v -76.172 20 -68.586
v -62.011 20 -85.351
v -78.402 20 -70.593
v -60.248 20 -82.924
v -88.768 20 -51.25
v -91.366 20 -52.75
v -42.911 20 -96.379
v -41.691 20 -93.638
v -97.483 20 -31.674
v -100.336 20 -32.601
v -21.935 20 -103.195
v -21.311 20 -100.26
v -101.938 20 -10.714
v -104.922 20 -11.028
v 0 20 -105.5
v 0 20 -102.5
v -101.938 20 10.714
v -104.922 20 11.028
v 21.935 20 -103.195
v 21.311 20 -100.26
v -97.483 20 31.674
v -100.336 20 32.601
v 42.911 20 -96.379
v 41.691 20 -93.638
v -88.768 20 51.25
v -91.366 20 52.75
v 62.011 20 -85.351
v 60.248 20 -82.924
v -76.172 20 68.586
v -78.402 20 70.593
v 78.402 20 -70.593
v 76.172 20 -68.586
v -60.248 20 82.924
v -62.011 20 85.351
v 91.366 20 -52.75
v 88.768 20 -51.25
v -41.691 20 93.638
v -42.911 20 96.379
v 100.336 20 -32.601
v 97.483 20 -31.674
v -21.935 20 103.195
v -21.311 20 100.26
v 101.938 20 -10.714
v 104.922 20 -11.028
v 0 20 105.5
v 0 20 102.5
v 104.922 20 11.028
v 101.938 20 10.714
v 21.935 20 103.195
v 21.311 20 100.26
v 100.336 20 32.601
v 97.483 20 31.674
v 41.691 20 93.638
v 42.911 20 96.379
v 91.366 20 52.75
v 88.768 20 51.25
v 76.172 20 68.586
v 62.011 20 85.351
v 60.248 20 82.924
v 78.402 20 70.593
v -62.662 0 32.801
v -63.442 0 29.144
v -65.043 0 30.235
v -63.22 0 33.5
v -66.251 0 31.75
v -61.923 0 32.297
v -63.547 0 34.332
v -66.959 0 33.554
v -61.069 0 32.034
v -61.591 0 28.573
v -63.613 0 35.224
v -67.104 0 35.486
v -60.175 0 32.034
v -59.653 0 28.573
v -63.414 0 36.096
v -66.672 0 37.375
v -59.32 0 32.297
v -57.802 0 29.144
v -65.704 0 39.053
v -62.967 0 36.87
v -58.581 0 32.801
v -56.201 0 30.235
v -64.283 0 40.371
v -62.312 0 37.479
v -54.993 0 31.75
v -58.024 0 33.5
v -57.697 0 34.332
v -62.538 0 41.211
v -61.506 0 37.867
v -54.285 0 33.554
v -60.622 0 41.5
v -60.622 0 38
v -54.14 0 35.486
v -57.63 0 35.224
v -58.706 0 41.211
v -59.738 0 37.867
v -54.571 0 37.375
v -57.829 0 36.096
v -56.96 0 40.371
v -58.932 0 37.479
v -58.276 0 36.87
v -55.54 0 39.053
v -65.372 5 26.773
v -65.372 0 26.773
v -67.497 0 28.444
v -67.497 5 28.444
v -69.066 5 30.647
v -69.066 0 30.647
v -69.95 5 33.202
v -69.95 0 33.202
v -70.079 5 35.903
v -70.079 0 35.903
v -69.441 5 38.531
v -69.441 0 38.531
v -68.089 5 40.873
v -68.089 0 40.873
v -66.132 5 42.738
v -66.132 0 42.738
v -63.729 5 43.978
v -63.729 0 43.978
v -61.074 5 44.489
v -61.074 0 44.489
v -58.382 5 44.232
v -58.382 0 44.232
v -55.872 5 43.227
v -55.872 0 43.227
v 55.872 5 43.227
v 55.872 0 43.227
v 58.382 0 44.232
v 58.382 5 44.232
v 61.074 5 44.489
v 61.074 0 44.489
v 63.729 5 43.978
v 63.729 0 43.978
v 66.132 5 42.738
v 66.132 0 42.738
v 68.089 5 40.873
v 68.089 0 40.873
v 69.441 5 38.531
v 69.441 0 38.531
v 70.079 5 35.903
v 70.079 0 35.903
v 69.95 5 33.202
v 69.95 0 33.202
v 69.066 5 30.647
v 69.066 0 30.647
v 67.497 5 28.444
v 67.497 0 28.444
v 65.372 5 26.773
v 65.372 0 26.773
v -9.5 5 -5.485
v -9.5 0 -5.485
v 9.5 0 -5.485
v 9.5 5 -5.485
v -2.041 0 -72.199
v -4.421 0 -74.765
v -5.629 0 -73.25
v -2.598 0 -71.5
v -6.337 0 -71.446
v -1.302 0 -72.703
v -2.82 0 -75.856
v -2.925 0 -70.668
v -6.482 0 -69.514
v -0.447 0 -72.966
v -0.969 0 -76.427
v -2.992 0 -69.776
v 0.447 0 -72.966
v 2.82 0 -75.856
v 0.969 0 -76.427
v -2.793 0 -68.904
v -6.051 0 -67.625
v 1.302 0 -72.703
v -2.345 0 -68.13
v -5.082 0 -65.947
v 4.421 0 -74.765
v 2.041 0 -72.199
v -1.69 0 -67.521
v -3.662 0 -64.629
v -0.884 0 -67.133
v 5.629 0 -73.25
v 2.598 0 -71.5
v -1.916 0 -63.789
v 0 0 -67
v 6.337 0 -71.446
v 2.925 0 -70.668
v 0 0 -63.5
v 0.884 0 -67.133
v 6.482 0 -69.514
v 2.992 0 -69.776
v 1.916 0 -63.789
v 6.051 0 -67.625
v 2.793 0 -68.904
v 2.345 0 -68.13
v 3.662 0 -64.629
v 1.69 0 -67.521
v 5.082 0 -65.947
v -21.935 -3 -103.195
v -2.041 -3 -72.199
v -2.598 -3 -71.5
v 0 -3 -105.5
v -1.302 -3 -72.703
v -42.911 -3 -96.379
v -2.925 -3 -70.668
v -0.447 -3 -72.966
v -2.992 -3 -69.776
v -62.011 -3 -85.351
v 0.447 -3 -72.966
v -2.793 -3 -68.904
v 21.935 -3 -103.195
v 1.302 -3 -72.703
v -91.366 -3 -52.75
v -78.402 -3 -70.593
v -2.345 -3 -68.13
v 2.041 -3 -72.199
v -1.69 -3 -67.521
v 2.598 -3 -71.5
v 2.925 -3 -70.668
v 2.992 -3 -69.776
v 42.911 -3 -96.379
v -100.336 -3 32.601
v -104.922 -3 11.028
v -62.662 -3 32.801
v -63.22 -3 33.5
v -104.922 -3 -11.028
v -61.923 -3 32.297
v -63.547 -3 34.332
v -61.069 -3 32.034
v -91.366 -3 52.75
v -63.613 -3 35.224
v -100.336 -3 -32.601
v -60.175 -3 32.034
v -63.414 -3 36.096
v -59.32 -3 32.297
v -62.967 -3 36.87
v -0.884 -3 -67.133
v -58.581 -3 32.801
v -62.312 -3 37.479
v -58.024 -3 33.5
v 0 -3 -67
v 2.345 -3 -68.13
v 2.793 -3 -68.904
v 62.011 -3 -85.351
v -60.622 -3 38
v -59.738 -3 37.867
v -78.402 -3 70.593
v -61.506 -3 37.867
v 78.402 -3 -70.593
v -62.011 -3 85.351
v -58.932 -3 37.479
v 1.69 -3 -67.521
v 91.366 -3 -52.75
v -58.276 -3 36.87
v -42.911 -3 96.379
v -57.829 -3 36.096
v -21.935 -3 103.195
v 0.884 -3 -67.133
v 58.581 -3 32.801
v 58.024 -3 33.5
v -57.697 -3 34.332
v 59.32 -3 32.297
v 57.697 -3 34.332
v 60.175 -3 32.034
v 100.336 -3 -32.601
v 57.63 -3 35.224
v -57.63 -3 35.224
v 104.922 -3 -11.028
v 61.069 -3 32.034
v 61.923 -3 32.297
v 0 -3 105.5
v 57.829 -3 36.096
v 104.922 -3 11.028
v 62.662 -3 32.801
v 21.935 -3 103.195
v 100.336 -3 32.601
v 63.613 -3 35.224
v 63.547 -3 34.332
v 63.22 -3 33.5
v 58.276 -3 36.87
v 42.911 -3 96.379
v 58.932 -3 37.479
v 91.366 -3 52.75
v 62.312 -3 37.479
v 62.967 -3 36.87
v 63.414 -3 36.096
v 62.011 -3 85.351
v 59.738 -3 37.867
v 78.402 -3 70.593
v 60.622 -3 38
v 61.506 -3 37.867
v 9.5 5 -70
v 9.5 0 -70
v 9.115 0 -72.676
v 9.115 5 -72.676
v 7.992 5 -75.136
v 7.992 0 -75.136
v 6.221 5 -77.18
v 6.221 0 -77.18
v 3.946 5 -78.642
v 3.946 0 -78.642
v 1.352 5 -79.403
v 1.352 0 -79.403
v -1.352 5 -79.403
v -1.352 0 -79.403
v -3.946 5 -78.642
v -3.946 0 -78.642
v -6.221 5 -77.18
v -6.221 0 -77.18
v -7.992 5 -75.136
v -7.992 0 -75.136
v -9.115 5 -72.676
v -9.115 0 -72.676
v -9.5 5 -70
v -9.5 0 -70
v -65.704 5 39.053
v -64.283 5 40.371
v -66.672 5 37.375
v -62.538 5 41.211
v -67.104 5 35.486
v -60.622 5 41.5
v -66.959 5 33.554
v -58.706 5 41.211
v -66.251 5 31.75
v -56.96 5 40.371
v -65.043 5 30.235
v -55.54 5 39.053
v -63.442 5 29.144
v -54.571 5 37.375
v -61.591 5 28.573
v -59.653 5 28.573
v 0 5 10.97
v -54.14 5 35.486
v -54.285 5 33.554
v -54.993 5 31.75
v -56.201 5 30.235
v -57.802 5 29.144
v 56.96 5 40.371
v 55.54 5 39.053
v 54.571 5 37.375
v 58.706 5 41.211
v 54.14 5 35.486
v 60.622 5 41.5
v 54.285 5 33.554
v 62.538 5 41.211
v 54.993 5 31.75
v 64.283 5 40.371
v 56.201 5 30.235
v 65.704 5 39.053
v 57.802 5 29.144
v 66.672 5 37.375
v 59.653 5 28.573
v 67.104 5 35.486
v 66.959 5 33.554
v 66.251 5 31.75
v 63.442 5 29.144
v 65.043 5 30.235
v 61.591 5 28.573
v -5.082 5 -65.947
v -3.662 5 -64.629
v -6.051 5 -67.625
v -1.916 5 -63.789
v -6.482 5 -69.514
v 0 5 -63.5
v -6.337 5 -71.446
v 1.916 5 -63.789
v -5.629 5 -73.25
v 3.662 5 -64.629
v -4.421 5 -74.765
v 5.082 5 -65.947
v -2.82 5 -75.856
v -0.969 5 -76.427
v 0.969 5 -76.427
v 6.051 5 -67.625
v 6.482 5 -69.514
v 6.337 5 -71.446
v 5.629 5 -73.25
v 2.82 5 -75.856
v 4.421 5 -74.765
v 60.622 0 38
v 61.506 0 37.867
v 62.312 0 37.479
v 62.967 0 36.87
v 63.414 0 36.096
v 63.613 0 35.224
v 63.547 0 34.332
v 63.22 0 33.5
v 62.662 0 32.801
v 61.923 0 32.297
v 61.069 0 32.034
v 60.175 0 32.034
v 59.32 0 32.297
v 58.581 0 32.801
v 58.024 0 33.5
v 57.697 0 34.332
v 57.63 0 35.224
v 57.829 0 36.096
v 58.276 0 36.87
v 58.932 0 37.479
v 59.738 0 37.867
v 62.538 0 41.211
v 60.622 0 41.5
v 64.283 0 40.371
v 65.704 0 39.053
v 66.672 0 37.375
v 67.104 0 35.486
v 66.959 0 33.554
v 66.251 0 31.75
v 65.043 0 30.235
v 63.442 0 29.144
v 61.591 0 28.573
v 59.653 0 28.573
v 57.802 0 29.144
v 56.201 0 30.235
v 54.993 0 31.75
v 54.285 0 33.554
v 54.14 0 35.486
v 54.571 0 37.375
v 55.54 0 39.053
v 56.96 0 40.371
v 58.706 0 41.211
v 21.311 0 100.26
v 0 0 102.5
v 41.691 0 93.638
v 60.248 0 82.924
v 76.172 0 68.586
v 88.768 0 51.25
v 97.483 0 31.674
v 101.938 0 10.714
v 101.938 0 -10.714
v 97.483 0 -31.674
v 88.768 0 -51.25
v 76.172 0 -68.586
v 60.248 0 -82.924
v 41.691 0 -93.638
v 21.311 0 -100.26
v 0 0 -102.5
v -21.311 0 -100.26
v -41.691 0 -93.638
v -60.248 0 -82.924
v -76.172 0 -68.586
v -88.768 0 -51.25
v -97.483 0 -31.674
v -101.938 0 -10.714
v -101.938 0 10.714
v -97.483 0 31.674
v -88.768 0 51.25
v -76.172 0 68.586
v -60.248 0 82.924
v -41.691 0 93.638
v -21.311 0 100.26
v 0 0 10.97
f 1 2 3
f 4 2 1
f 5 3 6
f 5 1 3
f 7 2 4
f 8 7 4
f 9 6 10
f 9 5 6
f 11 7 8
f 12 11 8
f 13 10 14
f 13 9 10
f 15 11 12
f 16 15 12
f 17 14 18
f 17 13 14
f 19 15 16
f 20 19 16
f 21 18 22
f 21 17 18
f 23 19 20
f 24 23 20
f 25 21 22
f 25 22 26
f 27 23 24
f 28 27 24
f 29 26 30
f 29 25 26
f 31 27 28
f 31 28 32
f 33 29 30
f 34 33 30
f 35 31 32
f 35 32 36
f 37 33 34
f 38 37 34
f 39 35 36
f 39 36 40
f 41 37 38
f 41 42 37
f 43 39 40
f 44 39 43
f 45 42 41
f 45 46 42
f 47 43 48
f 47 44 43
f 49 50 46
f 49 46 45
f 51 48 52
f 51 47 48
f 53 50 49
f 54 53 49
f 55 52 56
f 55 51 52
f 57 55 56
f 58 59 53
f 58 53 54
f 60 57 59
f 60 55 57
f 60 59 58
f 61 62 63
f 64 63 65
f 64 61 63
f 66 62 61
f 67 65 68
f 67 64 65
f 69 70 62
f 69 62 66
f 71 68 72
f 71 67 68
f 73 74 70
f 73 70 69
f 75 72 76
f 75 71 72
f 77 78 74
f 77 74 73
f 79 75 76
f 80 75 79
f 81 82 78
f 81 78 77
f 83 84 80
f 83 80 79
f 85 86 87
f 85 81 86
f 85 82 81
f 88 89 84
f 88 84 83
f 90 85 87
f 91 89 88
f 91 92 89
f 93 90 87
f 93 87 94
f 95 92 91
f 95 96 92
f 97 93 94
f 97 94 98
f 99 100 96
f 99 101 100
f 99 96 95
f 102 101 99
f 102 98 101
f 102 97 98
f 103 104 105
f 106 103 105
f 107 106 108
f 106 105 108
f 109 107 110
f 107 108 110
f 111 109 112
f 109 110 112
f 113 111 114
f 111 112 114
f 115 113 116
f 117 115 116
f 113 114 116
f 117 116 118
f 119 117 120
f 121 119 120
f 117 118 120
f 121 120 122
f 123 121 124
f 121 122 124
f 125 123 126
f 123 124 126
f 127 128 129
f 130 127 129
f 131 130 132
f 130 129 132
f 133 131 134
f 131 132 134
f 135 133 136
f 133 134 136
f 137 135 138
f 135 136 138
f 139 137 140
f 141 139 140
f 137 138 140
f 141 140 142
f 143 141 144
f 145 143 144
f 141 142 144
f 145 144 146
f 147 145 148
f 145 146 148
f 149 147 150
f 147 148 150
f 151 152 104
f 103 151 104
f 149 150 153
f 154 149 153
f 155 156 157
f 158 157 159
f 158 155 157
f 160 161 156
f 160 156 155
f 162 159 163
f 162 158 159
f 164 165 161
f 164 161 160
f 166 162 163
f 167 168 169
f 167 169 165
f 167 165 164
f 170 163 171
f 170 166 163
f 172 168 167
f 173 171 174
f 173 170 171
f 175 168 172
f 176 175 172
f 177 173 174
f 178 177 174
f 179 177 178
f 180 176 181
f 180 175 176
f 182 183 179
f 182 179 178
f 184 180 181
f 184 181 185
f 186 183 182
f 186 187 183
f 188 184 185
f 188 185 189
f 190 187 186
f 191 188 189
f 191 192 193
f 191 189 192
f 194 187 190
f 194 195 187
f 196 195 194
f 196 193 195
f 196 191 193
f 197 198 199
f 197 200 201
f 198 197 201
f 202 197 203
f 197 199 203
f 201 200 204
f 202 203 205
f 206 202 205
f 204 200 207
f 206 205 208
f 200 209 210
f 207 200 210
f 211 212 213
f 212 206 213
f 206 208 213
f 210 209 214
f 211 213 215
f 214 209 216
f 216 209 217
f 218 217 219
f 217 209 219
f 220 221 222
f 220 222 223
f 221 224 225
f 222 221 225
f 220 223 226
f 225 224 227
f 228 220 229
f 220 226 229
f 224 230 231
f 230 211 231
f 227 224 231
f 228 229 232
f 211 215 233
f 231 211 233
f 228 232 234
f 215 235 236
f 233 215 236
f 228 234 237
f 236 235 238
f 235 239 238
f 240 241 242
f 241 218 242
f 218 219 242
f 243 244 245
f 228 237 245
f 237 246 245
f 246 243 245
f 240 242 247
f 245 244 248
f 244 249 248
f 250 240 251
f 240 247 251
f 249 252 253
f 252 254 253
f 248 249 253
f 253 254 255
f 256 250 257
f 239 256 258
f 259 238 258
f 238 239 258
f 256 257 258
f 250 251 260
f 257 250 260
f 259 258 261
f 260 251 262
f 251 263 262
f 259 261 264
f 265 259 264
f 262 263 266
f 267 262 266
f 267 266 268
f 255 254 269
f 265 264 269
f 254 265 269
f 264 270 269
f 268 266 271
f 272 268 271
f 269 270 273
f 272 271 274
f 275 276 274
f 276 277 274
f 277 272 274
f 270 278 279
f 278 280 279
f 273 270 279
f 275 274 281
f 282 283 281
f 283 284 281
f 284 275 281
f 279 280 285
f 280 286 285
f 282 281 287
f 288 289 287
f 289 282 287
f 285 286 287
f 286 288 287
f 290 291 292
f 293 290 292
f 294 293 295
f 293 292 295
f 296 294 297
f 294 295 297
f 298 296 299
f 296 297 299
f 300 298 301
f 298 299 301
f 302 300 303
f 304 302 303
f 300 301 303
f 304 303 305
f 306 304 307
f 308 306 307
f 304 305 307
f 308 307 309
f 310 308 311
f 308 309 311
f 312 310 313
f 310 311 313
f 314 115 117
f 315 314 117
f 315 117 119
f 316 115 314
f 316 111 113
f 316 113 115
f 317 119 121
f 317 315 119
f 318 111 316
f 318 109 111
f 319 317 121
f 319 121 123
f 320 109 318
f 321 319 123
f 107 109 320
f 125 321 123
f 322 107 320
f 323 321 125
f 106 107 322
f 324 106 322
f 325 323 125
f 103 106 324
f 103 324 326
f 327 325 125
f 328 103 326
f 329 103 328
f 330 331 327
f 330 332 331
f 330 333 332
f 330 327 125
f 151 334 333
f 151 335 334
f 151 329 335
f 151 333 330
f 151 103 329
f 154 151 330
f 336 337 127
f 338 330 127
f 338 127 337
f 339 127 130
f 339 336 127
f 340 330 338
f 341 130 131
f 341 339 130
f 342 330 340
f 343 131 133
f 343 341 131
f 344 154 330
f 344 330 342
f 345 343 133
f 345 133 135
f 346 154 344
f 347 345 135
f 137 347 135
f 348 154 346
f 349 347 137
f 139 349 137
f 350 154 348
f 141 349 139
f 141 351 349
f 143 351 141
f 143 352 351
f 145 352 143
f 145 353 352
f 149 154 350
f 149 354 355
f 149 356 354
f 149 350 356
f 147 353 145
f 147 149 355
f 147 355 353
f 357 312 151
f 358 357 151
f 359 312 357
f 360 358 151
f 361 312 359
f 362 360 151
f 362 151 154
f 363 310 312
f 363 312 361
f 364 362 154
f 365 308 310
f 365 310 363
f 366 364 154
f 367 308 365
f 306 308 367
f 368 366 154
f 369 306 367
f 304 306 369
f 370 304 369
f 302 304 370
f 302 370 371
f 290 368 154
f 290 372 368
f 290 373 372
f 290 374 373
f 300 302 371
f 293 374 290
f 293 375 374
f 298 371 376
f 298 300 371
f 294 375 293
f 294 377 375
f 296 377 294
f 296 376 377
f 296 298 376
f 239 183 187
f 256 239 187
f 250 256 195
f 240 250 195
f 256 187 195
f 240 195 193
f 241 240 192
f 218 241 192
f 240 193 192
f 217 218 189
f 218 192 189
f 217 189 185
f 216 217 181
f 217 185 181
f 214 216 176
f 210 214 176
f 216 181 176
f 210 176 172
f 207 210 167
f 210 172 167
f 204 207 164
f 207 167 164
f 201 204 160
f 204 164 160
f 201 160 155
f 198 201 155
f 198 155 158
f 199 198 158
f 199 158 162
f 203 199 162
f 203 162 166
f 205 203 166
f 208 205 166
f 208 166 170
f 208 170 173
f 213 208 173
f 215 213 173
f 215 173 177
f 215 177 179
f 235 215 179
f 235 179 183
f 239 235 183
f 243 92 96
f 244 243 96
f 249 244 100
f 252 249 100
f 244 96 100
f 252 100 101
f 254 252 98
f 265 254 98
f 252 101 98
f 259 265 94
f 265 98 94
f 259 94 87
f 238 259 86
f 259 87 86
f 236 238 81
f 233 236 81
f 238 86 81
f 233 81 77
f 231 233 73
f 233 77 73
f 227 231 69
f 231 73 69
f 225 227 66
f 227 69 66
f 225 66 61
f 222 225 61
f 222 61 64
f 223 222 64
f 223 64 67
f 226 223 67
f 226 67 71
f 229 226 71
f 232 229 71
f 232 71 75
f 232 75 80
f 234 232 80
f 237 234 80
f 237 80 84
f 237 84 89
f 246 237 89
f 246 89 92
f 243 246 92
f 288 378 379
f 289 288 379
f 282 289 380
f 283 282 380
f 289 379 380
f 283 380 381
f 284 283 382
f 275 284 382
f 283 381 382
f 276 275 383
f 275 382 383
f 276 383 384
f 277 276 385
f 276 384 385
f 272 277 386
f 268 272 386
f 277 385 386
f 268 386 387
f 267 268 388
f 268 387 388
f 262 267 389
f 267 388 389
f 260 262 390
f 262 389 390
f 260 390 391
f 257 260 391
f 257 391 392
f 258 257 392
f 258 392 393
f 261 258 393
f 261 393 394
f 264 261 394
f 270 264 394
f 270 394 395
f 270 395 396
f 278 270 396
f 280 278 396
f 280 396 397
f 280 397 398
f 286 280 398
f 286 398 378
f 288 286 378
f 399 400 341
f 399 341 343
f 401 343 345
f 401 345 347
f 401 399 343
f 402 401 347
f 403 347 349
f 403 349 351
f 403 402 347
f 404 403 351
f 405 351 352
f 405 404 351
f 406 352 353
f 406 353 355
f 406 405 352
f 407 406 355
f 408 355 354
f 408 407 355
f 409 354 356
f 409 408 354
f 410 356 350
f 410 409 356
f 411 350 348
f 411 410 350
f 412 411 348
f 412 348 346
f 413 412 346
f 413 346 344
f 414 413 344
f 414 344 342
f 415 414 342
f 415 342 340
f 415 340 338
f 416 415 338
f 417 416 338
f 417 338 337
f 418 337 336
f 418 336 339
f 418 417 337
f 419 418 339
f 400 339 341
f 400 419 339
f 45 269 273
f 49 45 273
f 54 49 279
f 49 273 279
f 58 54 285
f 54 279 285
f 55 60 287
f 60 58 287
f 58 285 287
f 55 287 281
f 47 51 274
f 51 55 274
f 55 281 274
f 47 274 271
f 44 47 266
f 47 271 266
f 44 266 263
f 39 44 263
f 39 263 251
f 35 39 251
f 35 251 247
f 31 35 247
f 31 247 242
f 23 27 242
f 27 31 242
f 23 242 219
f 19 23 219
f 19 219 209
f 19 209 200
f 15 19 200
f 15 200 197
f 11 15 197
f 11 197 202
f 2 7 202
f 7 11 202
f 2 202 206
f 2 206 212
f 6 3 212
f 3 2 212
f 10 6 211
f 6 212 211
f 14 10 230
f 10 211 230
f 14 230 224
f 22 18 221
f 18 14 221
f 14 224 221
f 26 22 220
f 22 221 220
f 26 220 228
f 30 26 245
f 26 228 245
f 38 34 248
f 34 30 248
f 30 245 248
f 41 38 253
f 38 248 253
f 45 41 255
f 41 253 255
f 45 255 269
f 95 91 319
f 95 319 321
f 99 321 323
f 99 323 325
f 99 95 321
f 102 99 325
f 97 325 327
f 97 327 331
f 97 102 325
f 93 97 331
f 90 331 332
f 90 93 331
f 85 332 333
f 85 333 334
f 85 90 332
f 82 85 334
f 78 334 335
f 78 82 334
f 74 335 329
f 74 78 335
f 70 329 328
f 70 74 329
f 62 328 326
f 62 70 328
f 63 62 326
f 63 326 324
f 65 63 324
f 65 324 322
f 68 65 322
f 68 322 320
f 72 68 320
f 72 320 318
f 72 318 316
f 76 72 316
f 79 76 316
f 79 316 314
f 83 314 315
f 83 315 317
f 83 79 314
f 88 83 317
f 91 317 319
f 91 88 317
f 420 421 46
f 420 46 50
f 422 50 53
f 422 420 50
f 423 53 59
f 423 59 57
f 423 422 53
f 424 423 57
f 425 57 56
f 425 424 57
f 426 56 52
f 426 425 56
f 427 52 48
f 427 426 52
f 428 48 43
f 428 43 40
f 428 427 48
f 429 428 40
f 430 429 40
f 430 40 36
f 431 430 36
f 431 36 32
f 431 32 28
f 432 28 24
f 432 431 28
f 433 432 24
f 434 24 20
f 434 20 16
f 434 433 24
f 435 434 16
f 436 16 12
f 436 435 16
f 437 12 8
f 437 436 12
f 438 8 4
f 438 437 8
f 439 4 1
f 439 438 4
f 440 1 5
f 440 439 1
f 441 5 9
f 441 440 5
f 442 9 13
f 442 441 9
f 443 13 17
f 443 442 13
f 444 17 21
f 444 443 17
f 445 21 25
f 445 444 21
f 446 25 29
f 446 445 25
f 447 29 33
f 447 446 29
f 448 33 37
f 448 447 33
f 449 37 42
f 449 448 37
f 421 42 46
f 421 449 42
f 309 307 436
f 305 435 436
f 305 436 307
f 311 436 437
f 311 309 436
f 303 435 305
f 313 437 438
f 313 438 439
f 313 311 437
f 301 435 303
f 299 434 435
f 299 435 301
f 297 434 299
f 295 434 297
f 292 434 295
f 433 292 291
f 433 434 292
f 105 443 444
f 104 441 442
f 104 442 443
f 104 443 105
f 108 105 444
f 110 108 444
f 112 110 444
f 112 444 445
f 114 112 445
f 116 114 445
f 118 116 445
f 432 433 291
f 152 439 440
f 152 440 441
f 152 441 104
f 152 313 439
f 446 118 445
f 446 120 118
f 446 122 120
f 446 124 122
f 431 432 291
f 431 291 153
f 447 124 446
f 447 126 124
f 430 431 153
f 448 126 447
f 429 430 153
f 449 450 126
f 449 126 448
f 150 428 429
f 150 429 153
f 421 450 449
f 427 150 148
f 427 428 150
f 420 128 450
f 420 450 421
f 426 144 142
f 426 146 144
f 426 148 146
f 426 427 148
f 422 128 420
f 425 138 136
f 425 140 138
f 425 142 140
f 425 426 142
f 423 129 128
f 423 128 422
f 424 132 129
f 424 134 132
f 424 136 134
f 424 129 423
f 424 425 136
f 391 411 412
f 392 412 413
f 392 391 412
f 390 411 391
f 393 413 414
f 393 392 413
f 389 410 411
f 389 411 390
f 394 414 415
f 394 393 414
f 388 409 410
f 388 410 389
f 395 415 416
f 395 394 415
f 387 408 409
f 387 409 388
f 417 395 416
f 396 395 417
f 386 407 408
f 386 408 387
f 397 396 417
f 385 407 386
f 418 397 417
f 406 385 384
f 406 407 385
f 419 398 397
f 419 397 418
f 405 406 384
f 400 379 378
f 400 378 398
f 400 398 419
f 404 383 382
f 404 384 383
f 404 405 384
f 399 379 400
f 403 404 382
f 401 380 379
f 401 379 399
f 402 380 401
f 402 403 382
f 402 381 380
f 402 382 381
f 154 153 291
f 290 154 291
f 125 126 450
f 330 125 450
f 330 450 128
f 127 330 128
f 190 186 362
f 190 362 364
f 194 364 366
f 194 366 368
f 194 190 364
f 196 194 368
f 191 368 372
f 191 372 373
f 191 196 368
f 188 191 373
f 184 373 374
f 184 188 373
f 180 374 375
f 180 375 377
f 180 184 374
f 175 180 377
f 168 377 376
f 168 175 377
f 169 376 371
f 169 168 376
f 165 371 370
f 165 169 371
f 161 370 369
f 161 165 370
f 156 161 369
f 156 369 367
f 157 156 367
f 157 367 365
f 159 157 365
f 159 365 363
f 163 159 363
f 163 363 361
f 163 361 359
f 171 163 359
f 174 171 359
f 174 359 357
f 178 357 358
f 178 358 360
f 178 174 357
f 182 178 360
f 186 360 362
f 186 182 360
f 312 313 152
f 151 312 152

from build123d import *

# Parameters (mm, degrees)
SKETCH1_R               = 102.5
BOSS_EXTRUDE2_DEPTH     = 20
SHELL3_T                = 3
SKETCH3_R               = 6.5
BOSS_EXTRUDE8_DEPTH     = 5
SKETCH5_R               = 3
CUT_EXTRUDE2_DEPTH      = 151.534049304
CUT_EXTRUDE2_DEPTH_BACK = 151.534049304


with BuildPart() as part:
    # Sketch1 → Boss-Extrude2 (new body)
    with BuildSketch(Plane(origin=(0, 0, 0), x_dir=(1, 0, 0), z_dir=(0, 1, 0))):
        with Locations(Location((0, 0, 0), (0, 0, 270))):
            Circle(SKETCH1_R)
    extrude(amount=BOSS_EXTRUDE2_DEPTH)

    # Shell3
    shell3_openings = [part.faces().sort_by_distance(p)[0] for p in [
        (0, 20, 0),
    ]]
    offset(amount=SHELL3_T, openings=shell3_openings, kind=Kind.INTERSECTION)

    # Sketch3 → Boss-Extrude8 (add)
    with BuildSketch(Plane(origin=(0, 0, 0), x_dir=(1, 0, 0), z_dir=(0, 1, 0))):
        with BuildLine():
            ThreePointArc((9.5, 70), (0, 79.5), (-9.5, 70))
            Line((-9.5, 70), (-9.5, 5.484827557))
            Line((-9.5, 5.484827557), (-65.371778265, -26.772758664))
            ThreePointArc((-65.371778265, -26.772758664), (-68.849019601, -39.75), (-55.871778265, -43.227241336))
            Line((-55.871778265, -43.227241336), (0, -10.969655115))
            Line((0, -10.969655115), (55.871778265, -43.227241336))
            ThreePointArc((55.871778265, -43.227241336), (68.849019601, -39.75), (65.371778265, -26.772758664))
            Line((65.371778265, -26.772758664), (9.5, 5.484827557))
            Line((9.5, 5.484827557), (9.5, 70))
        make_face()
        with Locations(Location((-60.621778265, -35, 0), (0, 0, 270))):
            Circle(SKETCH3_R, mode=Mode.SUBTRACT)
        with Locations(Location((60.621778265, -35, 0), (0, 0, 270))):
            Circle(SKETCH3_R, mode=Mode.SUBTRACT)
        with Locations(Location((0, 70, 0), (0, 0, 270))):
            Circle(SKETCH3_R, mode=Mode.SUBTRACT)
    extrude(amount=BOSS_EXTRUDE8_DEPTH)

    # Sketch5 → Cut-Extrude2 (cut, two sides)
    with BuildSketch(Plane(origin=(0, 0, 0), x_dir=(1, 0, 0), z_dir=(0, 1, 0))) as cut_extrude2_sk:
        with Locations(Location((0, 70, 0), (0, 0, 270))):
            Circle(SKETCH5_R)
        with Locations(Location((60.621778265, -35, 0), (0, 0, 270))):
            Circle(SKETCH5_R)
        with Locations(Location((-60.621778265, -35, 0), (0, 0, 270))):
            Circle(SKETCH5_R)
    extrude(amount=CUT_EXTRUDE2_DEPTH, mode=Mode.SUBTRACT)
    extrude(cut_extrude2_sk.sketch, amount=-CUT_EXTRUDE2_DEPTH_BACK, mode=Mode.SUBTRACT)


solid = part.part
